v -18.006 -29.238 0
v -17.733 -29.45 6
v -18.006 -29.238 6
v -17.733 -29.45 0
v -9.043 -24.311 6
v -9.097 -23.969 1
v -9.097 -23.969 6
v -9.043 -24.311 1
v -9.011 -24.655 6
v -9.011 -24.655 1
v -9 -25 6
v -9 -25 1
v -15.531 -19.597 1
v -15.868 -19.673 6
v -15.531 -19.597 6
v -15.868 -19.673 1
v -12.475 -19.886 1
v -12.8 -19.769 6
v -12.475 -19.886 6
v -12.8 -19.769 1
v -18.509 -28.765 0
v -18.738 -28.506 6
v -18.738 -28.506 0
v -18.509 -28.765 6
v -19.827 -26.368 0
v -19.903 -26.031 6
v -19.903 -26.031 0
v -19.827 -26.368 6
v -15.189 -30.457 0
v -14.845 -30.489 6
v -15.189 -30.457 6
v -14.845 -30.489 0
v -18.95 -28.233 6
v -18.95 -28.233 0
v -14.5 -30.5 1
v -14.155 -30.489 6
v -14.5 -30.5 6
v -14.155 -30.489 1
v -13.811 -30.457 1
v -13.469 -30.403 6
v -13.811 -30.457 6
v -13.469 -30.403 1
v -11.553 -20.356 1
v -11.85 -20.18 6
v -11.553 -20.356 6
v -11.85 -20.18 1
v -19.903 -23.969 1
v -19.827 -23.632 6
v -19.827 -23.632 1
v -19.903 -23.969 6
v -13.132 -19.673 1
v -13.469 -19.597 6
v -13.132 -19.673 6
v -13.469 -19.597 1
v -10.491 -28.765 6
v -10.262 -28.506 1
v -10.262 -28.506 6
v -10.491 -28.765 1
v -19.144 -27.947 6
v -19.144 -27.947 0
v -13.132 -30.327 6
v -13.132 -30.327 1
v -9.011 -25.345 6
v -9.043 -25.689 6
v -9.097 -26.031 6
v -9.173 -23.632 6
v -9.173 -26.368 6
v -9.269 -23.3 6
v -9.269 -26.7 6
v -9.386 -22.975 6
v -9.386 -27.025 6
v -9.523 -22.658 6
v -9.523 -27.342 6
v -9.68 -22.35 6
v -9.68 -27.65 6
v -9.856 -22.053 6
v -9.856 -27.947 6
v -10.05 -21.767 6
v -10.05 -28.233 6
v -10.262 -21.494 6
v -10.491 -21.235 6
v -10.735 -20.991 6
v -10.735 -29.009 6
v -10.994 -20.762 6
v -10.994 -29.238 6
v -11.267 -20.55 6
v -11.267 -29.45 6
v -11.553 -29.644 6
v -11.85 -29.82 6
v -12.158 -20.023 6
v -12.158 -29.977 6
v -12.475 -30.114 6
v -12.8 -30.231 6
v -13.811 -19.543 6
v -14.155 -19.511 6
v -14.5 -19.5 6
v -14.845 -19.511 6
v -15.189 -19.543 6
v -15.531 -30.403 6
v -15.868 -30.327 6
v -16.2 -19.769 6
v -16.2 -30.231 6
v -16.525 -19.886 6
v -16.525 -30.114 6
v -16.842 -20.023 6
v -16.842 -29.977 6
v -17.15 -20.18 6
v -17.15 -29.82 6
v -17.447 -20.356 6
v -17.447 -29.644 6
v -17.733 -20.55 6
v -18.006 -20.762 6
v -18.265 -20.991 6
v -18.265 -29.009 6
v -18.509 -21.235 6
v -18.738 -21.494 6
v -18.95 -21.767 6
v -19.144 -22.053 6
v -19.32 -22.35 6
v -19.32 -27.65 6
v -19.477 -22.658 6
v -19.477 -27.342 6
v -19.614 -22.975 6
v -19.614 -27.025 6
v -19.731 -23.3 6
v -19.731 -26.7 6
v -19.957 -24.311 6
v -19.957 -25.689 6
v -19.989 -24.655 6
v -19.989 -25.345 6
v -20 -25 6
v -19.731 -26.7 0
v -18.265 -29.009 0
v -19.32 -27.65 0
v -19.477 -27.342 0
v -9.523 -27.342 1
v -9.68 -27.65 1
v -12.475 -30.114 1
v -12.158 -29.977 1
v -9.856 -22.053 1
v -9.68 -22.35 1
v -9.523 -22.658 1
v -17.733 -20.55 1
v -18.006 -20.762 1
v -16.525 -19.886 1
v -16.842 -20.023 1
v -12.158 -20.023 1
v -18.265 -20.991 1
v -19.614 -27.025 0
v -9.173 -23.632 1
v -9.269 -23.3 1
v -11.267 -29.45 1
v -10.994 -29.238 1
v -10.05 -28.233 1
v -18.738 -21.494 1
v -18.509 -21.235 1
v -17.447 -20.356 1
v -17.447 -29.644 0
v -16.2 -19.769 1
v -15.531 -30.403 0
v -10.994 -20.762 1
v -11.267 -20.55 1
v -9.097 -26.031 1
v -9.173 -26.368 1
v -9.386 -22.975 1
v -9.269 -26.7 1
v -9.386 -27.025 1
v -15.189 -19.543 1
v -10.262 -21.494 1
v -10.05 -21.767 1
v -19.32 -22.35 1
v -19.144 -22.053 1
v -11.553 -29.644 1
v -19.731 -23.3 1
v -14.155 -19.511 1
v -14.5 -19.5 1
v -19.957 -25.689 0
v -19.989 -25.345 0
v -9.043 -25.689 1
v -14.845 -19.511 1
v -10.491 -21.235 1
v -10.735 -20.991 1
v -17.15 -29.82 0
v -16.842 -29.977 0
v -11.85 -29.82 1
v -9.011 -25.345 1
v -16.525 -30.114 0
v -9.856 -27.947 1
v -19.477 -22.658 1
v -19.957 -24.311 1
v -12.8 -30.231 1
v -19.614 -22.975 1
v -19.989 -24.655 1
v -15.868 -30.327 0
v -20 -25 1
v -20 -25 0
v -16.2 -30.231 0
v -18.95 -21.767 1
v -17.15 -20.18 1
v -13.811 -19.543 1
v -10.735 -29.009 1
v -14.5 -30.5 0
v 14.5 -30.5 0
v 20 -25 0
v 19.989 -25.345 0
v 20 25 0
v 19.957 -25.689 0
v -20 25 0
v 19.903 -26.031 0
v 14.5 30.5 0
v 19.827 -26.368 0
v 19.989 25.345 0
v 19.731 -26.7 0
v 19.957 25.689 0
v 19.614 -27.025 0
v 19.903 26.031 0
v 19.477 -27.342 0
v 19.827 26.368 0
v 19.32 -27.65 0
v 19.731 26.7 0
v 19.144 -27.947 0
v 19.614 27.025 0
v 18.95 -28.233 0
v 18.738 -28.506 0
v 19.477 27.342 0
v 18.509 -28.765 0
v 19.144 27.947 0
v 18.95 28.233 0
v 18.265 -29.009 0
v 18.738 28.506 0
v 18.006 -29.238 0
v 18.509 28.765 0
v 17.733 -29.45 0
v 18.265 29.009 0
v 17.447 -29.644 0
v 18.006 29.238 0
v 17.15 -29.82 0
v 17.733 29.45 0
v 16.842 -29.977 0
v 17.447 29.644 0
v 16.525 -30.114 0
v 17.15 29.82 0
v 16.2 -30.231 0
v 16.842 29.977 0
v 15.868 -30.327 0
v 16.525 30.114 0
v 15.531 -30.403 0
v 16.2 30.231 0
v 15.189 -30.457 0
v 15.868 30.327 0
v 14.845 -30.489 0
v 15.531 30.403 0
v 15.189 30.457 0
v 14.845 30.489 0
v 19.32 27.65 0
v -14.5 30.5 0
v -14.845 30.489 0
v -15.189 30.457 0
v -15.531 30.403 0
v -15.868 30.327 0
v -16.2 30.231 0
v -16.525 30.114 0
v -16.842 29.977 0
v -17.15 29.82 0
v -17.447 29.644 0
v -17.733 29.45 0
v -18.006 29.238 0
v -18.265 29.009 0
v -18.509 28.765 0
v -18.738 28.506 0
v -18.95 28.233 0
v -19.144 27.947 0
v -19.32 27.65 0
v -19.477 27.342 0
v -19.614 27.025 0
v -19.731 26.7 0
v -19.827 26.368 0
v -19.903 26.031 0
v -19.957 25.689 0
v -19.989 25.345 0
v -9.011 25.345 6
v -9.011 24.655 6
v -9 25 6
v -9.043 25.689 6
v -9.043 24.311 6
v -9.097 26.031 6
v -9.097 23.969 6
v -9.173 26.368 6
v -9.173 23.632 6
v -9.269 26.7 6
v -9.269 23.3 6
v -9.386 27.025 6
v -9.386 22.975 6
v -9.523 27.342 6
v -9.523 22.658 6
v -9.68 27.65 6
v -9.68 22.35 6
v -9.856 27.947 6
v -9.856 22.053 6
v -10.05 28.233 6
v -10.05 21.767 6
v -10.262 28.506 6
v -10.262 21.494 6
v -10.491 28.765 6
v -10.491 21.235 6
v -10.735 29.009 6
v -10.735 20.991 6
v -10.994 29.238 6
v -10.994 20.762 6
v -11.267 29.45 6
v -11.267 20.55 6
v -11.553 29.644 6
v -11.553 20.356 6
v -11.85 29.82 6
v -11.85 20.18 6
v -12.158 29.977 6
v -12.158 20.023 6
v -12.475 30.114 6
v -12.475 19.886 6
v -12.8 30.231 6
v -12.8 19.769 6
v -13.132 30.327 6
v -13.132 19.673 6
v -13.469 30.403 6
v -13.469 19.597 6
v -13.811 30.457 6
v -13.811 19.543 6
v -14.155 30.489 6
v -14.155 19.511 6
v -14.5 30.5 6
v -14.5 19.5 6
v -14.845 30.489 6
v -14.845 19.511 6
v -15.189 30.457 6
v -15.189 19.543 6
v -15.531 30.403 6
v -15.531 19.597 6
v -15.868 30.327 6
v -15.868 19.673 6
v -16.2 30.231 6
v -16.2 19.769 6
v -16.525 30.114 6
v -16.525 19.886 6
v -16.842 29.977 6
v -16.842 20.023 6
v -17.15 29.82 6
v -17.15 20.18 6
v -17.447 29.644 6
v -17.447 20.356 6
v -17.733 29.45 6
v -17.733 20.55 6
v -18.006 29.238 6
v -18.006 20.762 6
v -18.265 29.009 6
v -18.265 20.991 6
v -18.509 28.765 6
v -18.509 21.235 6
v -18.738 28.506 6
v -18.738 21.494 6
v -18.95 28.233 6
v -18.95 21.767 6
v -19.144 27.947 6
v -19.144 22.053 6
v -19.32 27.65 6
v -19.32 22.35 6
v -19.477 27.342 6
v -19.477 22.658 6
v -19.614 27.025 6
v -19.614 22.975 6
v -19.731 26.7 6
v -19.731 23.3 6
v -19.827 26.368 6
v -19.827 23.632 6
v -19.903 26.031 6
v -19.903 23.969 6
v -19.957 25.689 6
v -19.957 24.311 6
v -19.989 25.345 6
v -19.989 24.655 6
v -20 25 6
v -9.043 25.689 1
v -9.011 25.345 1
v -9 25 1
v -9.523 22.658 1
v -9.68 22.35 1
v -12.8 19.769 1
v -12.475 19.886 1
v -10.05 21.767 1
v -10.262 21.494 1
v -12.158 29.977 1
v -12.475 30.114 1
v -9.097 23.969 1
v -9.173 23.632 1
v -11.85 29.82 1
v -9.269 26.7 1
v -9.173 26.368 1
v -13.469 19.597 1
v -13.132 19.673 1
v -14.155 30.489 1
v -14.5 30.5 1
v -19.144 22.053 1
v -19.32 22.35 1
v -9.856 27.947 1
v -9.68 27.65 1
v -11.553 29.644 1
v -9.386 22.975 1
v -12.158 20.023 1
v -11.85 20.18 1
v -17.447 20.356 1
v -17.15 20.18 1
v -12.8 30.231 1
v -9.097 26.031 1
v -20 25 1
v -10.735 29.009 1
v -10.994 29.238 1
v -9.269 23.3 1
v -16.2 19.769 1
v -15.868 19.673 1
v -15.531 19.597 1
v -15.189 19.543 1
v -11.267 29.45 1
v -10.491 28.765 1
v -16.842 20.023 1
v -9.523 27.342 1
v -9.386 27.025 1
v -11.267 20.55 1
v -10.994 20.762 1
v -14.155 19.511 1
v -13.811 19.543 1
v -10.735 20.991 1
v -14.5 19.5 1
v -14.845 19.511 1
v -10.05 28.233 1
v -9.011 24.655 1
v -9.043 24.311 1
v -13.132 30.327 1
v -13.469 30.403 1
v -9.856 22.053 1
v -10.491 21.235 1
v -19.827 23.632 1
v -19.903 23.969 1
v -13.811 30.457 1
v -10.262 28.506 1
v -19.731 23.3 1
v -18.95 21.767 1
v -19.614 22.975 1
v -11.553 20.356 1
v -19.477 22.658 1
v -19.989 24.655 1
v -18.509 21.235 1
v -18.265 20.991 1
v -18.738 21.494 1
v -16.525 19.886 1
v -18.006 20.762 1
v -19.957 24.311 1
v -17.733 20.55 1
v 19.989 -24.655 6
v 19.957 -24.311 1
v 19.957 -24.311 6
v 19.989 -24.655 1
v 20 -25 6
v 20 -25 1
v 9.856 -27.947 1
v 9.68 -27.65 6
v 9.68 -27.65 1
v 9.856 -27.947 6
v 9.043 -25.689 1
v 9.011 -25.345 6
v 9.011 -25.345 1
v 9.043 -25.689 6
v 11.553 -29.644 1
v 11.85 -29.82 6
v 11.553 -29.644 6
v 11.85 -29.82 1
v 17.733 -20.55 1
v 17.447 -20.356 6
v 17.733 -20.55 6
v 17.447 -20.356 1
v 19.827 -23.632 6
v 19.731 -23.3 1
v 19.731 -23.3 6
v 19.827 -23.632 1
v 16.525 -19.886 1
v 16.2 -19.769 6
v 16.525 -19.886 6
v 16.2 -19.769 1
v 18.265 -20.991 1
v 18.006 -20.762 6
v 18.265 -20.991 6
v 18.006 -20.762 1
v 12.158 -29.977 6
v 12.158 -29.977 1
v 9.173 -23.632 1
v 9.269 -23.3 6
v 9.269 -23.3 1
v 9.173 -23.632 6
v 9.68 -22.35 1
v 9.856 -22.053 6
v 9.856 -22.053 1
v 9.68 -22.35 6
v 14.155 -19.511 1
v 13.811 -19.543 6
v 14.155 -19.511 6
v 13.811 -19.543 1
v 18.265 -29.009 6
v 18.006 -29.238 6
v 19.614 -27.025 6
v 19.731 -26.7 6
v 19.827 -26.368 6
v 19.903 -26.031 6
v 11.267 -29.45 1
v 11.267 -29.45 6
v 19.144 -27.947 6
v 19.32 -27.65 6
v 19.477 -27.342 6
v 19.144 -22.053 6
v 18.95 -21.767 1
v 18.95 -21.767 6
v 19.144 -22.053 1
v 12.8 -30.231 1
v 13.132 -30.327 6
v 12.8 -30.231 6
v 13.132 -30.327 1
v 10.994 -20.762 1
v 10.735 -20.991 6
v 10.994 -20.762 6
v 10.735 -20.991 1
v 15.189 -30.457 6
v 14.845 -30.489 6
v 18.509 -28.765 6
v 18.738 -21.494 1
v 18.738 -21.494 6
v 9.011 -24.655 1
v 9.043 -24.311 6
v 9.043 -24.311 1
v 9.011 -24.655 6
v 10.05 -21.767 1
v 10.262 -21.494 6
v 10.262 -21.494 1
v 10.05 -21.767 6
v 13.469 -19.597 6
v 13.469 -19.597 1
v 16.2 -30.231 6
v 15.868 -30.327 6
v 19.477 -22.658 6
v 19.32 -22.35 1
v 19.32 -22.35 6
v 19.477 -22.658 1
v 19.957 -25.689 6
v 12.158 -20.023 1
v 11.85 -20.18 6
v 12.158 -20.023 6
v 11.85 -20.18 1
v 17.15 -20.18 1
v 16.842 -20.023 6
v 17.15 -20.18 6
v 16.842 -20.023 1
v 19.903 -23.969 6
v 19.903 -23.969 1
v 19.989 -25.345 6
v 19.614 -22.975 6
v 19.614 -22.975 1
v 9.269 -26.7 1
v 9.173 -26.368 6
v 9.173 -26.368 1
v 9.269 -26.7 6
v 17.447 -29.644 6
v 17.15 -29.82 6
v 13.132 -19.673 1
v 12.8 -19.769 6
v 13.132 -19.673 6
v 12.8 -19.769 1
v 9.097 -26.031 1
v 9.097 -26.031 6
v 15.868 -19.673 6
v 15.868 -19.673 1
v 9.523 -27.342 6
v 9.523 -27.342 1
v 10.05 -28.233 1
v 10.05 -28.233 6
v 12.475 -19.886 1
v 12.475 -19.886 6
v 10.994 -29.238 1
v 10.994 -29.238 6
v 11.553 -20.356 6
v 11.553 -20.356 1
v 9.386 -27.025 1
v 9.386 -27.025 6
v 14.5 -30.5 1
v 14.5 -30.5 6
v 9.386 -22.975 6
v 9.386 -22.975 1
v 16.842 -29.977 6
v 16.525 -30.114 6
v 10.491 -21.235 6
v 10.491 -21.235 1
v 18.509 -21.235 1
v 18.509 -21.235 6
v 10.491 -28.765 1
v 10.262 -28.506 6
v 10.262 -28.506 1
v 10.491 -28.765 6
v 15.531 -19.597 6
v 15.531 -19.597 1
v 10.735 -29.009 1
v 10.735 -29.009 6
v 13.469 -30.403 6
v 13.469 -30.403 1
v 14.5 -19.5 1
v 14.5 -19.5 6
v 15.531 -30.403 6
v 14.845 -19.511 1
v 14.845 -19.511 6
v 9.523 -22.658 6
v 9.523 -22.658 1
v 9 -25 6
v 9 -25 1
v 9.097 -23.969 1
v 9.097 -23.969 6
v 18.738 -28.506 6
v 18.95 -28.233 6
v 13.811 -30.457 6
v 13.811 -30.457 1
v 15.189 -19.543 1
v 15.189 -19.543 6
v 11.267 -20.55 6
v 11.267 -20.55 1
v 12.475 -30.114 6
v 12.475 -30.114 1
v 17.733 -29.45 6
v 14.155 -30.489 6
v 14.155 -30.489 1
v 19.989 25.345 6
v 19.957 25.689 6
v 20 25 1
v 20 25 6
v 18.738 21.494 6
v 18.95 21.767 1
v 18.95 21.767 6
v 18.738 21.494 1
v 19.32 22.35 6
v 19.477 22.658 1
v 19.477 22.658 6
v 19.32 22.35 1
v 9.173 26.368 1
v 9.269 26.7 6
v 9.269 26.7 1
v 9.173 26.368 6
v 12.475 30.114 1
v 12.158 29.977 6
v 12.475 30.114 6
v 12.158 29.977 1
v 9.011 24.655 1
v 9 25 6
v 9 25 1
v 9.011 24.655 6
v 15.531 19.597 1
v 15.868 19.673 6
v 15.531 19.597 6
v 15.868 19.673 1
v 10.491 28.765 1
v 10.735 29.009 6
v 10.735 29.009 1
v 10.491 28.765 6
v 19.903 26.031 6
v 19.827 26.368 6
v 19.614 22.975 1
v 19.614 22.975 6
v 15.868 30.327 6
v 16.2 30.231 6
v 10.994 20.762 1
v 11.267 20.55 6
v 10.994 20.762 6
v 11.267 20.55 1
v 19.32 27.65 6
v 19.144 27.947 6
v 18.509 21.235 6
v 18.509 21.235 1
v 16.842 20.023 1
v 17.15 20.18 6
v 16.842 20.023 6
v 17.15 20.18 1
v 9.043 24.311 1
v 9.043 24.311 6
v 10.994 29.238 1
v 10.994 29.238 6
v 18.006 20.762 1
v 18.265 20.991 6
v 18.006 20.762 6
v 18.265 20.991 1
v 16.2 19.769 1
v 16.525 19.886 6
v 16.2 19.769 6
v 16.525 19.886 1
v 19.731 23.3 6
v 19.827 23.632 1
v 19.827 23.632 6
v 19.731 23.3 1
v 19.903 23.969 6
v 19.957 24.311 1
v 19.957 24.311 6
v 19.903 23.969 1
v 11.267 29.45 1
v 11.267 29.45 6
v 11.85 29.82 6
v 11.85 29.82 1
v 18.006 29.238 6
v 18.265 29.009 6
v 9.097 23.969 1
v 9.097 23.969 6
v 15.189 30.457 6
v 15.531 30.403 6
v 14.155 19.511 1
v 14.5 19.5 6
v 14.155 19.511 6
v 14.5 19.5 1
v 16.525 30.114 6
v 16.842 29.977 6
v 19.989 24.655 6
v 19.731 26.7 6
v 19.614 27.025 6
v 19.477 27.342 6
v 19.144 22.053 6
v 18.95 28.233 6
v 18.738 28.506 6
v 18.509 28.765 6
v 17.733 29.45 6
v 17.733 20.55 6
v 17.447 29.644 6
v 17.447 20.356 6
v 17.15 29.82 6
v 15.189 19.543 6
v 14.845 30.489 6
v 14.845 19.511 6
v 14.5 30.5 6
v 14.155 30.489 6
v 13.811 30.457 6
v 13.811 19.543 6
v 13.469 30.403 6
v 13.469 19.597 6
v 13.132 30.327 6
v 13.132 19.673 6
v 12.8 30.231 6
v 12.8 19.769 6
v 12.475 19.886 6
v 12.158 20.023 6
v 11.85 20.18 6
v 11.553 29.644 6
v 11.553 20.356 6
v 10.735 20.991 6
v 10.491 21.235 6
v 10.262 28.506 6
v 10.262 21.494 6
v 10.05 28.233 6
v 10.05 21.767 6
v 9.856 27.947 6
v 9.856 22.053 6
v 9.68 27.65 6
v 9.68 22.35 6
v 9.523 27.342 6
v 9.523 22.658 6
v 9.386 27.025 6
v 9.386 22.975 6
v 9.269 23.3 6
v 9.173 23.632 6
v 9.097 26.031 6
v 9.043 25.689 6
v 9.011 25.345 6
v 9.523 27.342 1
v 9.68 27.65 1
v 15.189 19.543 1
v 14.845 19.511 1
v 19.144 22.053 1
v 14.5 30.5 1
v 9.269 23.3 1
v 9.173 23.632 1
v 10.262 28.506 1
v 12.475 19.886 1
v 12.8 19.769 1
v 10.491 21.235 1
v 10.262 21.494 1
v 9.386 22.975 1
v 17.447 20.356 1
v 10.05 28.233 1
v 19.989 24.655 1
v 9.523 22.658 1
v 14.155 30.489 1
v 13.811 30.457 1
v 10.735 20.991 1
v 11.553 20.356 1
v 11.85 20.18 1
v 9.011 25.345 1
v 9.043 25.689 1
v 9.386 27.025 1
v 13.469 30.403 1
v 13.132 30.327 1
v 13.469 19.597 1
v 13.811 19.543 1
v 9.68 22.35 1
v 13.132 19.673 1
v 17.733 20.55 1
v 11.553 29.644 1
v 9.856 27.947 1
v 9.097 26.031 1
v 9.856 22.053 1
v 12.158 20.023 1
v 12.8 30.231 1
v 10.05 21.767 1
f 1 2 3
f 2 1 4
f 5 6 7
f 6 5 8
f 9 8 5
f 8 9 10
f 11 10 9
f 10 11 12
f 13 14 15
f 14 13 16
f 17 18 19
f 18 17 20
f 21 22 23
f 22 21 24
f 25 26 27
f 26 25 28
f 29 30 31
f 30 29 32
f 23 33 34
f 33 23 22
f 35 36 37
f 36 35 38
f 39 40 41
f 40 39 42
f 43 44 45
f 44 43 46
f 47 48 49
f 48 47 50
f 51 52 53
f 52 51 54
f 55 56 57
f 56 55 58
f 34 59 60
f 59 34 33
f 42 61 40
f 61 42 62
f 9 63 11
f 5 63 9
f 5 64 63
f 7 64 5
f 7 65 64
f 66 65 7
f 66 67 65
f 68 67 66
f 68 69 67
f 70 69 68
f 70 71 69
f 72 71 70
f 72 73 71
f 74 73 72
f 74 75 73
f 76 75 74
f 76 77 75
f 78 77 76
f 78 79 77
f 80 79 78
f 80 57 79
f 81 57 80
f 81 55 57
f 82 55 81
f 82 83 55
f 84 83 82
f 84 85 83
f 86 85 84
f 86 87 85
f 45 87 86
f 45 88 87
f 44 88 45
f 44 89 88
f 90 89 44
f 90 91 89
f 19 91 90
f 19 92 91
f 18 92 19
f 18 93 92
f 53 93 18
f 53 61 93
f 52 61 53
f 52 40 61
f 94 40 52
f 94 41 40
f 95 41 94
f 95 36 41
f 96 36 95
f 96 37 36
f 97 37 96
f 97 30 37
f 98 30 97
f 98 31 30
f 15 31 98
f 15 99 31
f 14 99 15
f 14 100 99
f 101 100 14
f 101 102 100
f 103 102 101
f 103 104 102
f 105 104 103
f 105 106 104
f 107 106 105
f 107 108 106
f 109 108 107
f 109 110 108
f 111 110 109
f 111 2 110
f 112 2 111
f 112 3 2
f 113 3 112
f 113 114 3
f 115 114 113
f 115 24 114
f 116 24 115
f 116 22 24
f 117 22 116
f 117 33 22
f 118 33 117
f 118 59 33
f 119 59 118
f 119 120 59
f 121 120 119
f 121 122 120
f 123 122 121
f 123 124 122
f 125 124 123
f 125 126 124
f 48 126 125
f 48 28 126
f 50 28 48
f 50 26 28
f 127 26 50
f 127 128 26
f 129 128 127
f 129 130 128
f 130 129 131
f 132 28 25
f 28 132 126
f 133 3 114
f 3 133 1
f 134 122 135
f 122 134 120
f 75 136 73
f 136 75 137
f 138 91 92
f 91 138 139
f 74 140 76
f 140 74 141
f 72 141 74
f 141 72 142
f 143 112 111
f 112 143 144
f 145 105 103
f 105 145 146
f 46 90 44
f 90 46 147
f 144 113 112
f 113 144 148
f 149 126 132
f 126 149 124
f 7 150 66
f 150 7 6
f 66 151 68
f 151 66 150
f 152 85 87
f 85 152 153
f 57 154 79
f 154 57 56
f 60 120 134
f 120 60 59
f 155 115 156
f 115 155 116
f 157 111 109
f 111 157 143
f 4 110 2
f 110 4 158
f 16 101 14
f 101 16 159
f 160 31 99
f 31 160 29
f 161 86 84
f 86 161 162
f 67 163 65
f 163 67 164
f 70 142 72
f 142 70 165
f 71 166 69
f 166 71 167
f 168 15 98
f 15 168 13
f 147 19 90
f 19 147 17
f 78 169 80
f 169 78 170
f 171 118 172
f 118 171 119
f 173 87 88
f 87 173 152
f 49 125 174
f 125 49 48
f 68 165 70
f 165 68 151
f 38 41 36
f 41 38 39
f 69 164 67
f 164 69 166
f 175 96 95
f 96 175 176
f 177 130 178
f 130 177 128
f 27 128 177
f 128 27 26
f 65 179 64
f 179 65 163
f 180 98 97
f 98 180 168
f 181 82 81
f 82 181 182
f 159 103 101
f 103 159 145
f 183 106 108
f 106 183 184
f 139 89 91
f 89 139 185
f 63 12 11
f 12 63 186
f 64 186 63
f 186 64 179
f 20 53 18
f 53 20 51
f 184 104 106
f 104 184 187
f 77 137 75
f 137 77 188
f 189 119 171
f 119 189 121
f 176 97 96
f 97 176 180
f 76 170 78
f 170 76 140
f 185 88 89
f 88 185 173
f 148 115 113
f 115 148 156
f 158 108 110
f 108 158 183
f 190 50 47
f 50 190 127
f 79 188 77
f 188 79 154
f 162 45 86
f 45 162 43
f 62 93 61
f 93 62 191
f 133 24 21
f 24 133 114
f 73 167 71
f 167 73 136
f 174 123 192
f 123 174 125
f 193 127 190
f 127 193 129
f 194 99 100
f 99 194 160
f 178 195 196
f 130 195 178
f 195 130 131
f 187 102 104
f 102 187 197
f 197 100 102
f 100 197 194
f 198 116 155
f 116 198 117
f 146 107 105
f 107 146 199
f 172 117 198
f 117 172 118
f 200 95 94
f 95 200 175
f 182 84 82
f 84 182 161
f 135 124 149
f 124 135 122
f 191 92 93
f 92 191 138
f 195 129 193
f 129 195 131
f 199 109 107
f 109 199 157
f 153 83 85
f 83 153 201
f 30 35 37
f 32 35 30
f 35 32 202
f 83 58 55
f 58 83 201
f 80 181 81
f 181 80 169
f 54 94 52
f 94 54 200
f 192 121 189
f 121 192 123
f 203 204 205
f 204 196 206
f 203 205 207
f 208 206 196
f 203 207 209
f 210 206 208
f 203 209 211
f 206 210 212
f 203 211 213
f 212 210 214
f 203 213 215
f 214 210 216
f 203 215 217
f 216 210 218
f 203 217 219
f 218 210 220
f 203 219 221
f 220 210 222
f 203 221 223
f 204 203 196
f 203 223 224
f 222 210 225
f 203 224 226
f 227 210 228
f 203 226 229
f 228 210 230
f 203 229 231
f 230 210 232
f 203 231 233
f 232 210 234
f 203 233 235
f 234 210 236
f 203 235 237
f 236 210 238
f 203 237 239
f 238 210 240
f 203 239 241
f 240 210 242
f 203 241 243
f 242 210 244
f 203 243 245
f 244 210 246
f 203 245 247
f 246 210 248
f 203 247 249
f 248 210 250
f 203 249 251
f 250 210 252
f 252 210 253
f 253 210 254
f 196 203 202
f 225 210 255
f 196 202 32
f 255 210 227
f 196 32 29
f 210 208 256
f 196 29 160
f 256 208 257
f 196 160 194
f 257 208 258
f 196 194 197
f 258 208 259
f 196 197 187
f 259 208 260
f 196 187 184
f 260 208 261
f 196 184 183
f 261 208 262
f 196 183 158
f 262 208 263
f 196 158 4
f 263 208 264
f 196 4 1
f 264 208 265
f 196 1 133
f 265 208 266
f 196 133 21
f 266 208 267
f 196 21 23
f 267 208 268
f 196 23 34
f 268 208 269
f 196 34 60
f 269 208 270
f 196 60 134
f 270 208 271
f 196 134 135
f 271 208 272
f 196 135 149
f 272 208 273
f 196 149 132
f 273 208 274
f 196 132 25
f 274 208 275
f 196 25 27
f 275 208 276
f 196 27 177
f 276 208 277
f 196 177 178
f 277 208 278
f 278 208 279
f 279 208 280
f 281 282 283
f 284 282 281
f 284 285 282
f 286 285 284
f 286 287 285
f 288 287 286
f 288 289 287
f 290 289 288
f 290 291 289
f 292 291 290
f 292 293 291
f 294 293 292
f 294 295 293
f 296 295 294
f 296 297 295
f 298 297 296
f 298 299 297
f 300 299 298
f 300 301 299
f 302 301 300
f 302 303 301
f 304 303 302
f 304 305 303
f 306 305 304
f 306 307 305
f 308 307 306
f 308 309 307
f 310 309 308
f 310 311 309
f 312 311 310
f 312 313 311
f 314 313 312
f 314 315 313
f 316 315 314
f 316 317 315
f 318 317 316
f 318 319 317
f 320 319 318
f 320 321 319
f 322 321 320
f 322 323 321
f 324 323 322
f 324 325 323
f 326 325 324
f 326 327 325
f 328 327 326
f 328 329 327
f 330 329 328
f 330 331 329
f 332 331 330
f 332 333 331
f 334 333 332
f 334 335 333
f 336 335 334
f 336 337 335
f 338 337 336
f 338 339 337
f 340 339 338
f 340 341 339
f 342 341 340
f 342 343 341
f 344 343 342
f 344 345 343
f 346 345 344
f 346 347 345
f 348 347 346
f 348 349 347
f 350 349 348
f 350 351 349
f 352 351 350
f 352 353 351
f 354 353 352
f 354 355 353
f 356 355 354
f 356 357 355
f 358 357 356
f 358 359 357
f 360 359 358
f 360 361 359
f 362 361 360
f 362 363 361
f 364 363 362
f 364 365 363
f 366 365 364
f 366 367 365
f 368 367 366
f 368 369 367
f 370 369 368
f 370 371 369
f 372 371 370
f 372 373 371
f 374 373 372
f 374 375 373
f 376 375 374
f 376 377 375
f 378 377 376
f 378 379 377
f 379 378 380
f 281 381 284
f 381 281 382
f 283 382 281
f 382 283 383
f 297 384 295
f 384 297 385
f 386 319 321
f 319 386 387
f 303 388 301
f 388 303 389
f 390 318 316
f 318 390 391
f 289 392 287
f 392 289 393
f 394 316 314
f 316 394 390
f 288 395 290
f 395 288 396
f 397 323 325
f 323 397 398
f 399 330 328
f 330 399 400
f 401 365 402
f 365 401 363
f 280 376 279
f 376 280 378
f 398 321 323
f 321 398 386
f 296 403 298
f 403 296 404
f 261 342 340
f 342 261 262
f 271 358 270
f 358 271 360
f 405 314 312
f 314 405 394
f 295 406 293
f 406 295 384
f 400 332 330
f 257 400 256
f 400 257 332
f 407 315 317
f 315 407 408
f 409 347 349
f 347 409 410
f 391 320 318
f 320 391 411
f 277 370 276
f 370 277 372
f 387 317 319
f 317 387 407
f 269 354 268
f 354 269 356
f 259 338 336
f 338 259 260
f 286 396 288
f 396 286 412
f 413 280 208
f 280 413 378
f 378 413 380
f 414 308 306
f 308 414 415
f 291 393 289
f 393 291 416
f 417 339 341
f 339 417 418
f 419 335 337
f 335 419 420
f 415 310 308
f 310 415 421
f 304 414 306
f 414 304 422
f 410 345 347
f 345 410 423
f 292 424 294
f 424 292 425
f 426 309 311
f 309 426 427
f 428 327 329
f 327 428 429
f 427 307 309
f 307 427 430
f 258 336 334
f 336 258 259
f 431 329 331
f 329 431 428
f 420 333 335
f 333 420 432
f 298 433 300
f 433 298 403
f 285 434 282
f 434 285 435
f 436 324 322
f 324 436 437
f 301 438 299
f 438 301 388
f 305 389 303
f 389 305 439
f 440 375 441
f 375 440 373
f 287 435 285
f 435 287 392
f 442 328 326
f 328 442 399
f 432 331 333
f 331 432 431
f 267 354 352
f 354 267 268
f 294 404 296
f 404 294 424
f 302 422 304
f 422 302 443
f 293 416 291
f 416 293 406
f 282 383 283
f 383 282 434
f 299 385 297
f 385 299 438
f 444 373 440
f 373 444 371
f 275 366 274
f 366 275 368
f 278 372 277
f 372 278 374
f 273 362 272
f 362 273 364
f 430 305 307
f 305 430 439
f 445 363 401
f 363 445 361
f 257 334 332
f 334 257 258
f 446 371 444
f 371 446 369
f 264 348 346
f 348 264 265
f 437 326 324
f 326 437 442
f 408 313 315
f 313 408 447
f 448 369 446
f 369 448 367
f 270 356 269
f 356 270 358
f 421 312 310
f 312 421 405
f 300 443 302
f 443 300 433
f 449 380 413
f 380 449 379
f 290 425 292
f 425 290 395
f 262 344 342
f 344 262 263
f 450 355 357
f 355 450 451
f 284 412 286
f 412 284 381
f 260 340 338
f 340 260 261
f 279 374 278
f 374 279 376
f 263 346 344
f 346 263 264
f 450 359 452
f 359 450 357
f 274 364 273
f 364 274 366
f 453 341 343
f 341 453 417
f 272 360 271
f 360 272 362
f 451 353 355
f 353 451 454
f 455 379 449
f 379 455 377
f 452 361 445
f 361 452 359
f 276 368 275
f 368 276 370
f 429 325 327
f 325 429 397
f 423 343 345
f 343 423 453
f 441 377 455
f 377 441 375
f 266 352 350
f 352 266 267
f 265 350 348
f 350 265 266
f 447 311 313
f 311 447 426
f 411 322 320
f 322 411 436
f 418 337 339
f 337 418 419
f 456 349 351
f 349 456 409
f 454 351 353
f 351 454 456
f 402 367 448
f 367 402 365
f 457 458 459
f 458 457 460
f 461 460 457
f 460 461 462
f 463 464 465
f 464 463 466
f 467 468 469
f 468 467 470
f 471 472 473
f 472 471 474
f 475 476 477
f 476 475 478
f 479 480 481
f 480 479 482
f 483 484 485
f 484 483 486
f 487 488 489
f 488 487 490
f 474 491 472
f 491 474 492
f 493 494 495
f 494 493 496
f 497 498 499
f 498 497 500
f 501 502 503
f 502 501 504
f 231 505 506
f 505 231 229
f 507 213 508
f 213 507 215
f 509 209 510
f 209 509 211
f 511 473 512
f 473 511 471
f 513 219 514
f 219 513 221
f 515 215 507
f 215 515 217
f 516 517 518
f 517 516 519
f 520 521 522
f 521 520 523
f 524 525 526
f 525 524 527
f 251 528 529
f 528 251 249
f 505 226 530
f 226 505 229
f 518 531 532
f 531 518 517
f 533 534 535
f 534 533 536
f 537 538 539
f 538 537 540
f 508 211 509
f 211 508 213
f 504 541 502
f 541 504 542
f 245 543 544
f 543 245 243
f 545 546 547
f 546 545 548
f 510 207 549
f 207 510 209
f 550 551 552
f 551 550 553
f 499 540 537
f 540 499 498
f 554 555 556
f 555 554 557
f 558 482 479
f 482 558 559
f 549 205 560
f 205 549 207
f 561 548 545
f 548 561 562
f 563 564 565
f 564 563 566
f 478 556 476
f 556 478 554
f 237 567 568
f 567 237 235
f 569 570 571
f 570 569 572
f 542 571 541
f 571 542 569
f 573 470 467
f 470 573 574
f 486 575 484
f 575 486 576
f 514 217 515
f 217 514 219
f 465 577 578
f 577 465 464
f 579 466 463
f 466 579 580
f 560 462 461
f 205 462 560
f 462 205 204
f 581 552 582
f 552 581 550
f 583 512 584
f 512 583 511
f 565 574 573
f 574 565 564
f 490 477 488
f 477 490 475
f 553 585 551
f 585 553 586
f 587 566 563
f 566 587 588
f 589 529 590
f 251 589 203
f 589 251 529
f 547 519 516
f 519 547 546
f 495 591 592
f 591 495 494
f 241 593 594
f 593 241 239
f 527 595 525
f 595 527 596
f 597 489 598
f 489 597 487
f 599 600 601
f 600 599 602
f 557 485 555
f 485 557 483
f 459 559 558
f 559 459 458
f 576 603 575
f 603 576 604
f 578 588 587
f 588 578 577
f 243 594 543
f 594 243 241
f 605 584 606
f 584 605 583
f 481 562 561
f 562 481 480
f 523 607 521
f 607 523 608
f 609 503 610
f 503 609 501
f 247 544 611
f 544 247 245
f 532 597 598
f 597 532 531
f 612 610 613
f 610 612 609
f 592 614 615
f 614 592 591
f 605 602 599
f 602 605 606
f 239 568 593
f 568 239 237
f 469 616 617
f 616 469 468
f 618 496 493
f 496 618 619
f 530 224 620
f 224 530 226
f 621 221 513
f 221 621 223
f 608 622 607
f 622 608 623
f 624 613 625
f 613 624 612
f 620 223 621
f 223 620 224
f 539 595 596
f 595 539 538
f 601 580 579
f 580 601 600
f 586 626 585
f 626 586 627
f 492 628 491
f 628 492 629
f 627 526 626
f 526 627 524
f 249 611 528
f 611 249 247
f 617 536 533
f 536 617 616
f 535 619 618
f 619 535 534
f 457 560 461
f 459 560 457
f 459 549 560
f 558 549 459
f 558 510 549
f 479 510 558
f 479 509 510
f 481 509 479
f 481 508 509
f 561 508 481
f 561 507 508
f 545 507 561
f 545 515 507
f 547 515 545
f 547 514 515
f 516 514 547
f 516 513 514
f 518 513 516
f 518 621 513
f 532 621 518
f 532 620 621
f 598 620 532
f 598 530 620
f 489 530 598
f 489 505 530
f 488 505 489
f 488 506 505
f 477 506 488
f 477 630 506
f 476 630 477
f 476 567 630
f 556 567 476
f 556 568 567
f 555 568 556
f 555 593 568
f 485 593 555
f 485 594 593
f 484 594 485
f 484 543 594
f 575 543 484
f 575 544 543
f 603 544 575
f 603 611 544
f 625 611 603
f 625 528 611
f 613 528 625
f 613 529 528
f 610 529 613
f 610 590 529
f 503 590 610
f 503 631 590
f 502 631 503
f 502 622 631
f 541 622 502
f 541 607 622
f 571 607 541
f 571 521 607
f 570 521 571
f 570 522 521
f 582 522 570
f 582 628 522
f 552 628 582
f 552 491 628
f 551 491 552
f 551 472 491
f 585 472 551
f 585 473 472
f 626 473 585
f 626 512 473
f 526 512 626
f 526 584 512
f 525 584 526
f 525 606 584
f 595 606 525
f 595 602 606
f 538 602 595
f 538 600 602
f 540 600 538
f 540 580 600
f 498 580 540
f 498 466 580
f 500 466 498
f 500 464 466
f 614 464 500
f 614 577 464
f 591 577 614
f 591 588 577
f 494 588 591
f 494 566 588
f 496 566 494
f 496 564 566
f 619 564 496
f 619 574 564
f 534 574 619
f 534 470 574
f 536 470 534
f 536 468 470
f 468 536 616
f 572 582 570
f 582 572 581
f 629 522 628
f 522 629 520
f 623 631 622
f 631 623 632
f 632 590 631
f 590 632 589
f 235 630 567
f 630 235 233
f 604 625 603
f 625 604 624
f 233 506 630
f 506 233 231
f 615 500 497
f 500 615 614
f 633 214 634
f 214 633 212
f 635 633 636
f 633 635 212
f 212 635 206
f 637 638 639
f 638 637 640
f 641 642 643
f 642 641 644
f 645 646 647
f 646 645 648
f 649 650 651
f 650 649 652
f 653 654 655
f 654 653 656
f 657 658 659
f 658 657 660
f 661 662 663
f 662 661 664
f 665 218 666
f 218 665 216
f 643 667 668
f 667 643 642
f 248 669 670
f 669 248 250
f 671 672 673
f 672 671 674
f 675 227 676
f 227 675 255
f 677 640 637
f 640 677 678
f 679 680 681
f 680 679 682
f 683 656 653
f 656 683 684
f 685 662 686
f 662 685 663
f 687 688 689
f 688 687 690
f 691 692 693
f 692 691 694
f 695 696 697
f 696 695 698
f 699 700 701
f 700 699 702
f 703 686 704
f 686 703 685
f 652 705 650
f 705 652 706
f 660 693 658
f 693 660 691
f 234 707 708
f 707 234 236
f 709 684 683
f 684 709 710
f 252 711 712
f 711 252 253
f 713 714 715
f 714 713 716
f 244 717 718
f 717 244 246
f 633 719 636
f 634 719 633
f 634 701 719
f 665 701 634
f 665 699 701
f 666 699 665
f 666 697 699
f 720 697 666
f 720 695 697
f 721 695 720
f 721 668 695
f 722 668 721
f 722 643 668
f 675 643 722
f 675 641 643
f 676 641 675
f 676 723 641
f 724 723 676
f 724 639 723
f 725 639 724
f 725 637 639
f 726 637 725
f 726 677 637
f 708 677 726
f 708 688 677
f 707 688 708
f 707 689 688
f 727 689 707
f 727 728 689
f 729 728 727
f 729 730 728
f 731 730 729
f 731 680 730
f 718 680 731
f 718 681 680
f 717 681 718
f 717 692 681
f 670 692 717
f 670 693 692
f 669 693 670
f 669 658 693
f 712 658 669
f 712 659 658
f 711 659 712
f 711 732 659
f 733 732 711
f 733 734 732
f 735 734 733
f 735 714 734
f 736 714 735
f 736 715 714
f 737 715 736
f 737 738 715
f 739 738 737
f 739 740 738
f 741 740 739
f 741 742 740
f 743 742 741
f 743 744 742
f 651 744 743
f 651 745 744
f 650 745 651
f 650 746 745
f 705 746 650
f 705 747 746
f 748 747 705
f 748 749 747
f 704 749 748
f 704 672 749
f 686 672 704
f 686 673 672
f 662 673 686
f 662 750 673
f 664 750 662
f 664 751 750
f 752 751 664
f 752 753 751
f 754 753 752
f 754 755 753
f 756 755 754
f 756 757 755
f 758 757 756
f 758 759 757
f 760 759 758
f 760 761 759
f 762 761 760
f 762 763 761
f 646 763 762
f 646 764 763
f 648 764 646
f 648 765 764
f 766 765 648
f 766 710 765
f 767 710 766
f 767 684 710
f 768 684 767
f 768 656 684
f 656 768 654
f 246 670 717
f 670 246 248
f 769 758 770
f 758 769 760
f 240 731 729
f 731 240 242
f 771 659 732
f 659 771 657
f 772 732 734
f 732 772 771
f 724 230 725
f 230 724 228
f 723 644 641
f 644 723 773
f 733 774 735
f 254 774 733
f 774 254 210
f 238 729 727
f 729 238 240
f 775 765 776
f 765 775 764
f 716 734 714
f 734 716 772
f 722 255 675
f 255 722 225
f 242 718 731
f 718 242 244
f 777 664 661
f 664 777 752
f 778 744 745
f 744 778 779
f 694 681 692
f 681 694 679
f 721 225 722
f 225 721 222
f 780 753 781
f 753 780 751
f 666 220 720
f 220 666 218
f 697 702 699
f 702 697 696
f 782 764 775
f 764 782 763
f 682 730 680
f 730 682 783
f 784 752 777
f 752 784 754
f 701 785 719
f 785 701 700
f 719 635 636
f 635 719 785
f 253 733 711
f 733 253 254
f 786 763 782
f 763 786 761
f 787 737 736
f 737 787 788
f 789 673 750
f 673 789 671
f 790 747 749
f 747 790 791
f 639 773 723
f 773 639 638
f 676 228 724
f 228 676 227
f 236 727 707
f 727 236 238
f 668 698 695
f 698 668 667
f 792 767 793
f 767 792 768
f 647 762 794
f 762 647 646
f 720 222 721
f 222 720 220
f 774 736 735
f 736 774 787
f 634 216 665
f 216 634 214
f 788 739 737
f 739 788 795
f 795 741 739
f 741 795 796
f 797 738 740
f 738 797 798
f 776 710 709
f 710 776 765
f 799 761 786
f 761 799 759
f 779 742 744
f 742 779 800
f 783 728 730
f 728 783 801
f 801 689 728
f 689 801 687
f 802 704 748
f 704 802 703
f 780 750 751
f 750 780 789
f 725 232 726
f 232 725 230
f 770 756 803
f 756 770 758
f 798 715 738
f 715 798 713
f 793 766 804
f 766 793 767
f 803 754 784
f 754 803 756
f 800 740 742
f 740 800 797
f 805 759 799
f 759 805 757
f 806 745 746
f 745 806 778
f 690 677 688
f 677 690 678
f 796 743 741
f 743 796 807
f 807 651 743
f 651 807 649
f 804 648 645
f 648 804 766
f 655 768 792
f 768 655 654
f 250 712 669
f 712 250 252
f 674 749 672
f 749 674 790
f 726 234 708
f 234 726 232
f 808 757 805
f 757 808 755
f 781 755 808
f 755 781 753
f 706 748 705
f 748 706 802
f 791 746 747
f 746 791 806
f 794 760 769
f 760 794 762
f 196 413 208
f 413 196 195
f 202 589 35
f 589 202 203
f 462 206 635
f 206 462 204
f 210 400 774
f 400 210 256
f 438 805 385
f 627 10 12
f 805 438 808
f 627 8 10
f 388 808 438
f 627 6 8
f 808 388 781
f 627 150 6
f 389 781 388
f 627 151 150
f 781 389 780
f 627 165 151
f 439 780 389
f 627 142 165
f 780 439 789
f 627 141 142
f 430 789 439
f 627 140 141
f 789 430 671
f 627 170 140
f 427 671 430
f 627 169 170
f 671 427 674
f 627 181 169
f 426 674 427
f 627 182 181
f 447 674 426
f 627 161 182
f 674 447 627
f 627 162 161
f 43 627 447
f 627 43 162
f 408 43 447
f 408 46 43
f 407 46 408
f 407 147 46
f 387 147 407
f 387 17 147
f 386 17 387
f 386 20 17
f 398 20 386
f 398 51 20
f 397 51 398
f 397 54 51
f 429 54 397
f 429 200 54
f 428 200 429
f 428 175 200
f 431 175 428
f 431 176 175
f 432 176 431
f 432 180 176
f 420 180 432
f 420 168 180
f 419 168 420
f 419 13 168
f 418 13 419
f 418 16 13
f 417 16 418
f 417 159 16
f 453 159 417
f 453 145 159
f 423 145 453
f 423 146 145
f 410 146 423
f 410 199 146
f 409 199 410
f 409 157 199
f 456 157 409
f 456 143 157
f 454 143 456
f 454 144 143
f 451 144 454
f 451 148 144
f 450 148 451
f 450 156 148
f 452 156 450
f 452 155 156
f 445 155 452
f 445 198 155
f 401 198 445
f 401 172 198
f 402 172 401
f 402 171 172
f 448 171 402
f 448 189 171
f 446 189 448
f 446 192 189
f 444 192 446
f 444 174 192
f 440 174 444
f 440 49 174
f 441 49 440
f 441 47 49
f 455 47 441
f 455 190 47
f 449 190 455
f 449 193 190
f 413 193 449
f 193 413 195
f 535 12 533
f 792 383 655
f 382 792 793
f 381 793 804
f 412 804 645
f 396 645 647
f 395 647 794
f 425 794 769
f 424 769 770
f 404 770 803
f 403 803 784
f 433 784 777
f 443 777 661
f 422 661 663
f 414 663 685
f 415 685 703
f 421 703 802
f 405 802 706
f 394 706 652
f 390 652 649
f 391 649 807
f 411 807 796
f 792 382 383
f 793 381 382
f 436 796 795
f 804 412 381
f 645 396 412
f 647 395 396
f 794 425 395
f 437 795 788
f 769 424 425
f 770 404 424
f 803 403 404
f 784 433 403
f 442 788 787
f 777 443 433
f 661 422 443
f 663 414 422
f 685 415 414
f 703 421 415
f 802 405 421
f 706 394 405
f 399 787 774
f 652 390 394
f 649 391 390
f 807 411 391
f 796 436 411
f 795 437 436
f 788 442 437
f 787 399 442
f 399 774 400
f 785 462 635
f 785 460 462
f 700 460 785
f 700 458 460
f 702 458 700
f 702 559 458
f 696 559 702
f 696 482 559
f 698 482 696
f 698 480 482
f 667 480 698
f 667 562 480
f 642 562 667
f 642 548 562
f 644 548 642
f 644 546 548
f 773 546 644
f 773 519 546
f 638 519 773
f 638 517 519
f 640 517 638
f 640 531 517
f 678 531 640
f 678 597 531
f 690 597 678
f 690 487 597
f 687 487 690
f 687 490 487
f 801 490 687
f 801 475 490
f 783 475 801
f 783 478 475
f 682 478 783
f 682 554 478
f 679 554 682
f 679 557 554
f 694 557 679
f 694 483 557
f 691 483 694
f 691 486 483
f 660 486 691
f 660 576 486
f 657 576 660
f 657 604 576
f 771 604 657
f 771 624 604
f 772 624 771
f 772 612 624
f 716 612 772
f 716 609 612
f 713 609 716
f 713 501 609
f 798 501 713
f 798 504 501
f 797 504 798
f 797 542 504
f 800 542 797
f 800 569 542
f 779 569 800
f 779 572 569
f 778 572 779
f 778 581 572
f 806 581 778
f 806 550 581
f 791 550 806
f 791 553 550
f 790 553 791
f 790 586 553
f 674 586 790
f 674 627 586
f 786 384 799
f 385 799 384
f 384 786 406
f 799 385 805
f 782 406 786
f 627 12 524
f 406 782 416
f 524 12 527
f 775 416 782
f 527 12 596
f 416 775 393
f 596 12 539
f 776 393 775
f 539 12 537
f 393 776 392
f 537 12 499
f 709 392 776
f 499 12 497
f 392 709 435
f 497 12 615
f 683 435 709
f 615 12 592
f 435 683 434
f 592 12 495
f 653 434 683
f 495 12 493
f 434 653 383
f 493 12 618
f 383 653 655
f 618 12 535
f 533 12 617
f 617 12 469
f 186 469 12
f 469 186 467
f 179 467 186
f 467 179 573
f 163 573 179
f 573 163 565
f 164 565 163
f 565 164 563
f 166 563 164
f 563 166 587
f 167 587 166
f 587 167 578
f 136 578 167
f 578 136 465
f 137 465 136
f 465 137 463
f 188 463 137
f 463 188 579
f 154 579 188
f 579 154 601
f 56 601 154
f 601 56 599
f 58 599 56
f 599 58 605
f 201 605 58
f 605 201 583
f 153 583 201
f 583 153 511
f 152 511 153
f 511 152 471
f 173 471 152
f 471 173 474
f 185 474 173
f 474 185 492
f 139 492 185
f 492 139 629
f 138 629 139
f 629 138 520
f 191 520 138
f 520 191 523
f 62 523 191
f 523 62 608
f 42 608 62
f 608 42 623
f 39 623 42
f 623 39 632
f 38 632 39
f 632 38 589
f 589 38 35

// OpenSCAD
module ramp_center_connector(
        glass_thickness = 5,
        plate_thickness = 1,
        hole_diameter = 11,
        dist_x = 8.5 + 12 / 2,
        dist_y = 19 + 12 / 2) {
    union() {
        translate([-dist_x, -dist_y, 0]) {
            cylinder(d = hole_diameter, h = plate_thickness + glass_thickness, $fn = 100);
        }
        translate([-dist_x, dist_y, 0]) {
            cylinder(d = hole_diameter, h = plate_thickness + glass_thickness, $fn = 100);
        }
        translate([dist_x, -dist_y, 0]) {
            cylinder(d = hole_diameter, h = plate_thickness + glass_thickness, $fn = 100);
        }
        translate([dist_x, dist_y, 0]) {
            cylinder(d = hole_diameter, h = plate_thickness + glass_thickness, $fn = 100);
        }
        hull() {
            translate([-dist_x, -dist_y, 0]) {
                cylinder(d = hole_diameter, h = plate_thickness, $fn = 100);
            }
            translate([-dist_x, dist_y, 0]) {
                cylinder(d = hole_diameter, h = plate_thickness, $fn = 100);
            }
            translate([dist_x, -dist_y, 0]) {
                cylinder(d = hole_diameter, h = plate_thickness, $fn = 100);
            }
            translate([dist_x, dist_y, 0]) {
                cylinder(d = hole_diameter, h = plate_thickness, $fn = 100);
            }
        }
    }
}

ramp_center_connector();
